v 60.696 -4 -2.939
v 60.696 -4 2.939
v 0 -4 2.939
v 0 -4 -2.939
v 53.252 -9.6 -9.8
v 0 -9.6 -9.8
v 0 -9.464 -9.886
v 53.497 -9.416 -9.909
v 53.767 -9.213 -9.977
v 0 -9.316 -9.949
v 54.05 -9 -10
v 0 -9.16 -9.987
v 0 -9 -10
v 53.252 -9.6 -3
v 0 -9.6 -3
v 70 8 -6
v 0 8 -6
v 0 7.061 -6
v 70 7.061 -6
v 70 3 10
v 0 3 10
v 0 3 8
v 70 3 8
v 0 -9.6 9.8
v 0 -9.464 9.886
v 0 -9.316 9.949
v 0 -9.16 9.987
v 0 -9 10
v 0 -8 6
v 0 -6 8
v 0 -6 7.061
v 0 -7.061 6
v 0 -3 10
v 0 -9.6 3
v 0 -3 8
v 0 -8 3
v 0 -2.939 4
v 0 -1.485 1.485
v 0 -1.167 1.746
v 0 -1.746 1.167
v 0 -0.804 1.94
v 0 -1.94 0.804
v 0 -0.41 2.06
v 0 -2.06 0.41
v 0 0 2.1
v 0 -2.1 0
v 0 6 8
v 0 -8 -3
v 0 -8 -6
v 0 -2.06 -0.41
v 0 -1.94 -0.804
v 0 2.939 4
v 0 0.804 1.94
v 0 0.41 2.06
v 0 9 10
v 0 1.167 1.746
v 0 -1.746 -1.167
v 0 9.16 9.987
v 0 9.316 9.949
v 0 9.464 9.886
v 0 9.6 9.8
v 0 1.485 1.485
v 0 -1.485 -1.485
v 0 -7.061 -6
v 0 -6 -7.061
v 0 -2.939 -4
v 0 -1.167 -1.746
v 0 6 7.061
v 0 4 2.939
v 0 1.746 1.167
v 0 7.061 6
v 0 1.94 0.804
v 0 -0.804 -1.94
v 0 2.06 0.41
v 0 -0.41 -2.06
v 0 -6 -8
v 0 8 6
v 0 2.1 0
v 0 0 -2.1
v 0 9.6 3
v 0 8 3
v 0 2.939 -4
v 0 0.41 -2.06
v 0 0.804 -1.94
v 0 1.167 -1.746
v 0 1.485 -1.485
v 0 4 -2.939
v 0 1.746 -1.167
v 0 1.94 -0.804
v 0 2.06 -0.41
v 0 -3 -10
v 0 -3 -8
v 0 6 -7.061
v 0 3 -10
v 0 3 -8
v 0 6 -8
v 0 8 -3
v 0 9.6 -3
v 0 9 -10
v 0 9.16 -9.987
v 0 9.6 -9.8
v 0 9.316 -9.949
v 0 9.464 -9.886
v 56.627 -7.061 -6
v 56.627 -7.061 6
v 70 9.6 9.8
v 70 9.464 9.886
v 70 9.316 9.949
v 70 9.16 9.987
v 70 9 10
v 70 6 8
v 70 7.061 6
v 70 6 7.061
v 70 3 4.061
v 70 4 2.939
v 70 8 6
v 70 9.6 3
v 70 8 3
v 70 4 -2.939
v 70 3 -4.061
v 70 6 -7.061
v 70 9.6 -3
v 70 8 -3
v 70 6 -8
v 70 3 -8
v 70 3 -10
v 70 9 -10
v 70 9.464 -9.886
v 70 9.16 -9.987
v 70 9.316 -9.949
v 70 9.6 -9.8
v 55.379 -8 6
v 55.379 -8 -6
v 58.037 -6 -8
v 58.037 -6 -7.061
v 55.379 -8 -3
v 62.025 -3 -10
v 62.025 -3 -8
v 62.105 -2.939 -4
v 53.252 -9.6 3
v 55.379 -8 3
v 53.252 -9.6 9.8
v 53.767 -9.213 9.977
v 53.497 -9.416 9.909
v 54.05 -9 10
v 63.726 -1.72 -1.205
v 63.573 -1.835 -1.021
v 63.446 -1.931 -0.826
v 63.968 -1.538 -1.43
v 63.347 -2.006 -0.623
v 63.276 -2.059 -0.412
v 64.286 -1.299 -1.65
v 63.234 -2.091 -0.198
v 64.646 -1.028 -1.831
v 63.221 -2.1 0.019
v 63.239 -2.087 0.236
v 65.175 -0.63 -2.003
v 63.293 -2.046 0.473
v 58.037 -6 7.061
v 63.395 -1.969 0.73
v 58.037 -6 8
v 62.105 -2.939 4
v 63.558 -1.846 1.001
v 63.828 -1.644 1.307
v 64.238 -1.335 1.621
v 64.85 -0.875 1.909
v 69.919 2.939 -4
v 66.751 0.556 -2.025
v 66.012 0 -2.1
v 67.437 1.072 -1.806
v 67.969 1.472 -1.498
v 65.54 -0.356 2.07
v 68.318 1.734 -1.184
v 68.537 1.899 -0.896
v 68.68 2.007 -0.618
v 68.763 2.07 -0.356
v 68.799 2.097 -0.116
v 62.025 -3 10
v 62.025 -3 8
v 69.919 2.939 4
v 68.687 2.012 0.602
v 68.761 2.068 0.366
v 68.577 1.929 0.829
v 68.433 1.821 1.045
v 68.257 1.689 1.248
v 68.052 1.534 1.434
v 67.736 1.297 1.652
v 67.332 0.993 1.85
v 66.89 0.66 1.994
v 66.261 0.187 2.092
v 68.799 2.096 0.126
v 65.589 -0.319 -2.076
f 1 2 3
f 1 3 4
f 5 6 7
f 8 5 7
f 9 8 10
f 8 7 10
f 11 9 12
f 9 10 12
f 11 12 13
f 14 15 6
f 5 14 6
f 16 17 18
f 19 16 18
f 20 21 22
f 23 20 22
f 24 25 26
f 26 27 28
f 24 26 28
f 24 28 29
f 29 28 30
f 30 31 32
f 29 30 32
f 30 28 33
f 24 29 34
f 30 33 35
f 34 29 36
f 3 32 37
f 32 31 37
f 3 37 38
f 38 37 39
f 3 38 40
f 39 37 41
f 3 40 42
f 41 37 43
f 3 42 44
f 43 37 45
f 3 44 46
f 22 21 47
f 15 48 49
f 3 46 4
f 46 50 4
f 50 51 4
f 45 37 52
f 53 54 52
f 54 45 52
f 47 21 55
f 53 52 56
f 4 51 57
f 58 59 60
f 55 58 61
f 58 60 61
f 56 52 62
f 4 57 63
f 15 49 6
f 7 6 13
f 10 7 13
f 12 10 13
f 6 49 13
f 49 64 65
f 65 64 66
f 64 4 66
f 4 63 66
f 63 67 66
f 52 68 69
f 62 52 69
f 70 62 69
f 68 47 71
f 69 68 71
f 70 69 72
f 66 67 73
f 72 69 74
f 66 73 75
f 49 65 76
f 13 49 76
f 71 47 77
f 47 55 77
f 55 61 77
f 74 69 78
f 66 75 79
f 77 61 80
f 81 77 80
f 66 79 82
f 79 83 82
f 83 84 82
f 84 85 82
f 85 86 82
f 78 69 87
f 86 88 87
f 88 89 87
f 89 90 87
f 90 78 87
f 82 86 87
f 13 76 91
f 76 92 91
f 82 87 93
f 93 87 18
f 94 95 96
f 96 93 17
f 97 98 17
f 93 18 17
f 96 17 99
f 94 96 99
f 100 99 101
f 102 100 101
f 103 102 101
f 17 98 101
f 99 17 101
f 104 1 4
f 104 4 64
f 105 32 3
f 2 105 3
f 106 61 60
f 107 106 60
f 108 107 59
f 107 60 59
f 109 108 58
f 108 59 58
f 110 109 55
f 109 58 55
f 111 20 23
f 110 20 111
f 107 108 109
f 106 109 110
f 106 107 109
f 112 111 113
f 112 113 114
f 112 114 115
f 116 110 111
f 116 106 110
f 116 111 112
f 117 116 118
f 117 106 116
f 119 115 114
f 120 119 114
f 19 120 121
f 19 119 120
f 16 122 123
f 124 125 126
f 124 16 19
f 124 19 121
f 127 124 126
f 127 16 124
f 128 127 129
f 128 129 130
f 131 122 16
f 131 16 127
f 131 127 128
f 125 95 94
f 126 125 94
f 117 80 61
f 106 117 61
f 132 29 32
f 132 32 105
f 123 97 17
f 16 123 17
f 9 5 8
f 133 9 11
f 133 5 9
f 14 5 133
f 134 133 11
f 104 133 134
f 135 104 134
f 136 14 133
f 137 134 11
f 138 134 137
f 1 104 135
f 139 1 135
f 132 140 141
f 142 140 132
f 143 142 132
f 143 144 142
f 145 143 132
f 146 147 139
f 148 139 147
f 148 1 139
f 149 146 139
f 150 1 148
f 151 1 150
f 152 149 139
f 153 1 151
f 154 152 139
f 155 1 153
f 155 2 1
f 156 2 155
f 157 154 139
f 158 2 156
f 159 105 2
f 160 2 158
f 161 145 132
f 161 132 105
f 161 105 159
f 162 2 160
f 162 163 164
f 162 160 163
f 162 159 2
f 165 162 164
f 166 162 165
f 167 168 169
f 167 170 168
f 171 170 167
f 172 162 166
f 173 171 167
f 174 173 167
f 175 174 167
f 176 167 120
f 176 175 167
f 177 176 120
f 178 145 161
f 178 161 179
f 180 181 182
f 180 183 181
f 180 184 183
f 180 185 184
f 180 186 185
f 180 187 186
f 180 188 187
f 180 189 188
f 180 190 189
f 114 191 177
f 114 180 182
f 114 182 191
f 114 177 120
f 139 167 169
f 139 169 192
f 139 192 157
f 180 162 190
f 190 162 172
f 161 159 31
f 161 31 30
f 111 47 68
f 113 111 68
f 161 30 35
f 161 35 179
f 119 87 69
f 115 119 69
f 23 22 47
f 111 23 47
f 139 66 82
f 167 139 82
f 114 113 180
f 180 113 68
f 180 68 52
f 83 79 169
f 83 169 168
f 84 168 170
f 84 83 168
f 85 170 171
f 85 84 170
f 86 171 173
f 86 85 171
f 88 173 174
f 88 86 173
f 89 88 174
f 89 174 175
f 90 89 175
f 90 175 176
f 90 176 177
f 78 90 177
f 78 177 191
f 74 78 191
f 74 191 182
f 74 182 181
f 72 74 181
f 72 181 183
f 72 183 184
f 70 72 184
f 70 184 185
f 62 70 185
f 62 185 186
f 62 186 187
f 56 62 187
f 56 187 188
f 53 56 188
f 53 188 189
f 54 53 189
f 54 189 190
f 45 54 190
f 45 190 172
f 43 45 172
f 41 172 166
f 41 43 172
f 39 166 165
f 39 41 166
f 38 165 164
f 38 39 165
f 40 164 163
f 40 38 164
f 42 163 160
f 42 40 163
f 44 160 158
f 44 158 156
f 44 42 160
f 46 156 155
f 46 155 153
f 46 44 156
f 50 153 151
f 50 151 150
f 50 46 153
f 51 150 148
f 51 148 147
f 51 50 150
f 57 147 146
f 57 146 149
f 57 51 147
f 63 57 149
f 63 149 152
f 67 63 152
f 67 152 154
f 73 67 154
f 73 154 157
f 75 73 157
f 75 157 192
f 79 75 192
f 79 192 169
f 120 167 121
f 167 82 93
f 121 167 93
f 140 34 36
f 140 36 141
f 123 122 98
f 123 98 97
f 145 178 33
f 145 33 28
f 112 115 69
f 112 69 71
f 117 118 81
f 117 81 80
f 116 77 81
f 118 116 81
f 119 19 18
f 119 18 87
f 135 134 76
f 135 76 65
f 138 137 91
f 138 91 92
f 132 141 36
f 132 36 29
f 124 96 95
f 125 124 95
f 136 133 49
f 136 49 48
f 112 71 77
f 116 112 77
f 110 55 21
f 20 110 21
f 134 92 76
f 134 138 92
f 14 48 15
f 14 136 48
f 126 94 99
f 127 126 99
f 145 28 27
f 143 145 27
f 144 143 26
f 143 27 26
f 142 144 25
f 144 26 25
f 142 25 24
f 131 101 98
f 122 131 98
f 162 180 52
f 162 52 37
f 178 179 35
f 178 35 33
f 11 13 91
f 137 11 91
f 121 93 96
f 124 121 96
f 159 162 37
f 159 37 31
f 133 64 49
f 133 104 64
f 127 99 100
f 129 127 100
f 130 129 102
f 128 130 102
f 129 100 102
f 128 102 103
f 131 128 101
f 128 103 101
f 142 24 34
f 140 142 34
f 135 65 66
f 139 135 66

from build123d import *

# Parameters (mm, degrees)
SKETCH1_R                = 2.1
BOSS_EXTRUDE1_DEPTH      = 70
CUT_EXTRUDE_1_DEPTH      = 1
CUT_EXTRUDE_1_DEPTH_BACK = 21


with BuildPart() as part:
    # Sketch1 → Boss-Extrude1 (new body)
    with BuildSketch(Plane(origin=(0, 0, 0), x_dir=(0, 0, -1), z_dir=(1, 0, 0))):
        with BuildLine():
            Line((-10, 9), (-10, 3))
            Line((-10, 3), (-8, 3))
            Line((-8, 3), (-8, 6))
            Line((-8, 6), (-7.060660172, 6))
            Line((-7.060660172, 6), (-4, 2.939339828))
            Line((-4, 2.939339828), (-4, -2.939339828))
            Line((-4, -2.939339828), (-7.060660172, -6))
            Line((-7.060660172, -6), (-8, -6))
            Line((-8, -6), (-8, -3))
            Line((-8, -3), (-10, -3))
            Line((-10, -3), (-10, -9))
            ThreePointArc((-10, -9), (-9.948683298, -9.316227766), (-9.8, -9.6))
            Line((-9.8, -9.6), (-3, -9.6))
            Line((-3, -9.6), (-3, -8))
            Line((-3, -8), (-6, -8))
            Line((-6, -8), (-6, -7.060660172))
            Line((-6, -7.060660172), (-2.939339828, -4))
            Line((-2.939339828, -4), (2.939339828, -4))
            Line((2.939339828, -4), (6, -7.060660172))
            Line((6, -7.060660172), (6, -8))
            Line((6, -8), (3, -8))
            Line((3, -8), (3, -9.6))
            Line((3, -9.6), (9.8, -9.6))
            ThreePointArc((9.8, -9.6), (9.948683298, -9.316227766), (10, -9))
            Line((10, -9), (10, -3))
            Line((10, -3), (8, -3))
            Line((8, -3), (8, -6))
            Line((8, -6), (7.060660172, -6))
            Line((7.060660172, -6), (4, -2.939339828))
            Line((4, -2.939339828), (4, 2.939339828))
            Line((4, 2.939339828), (7.060660172, 6))
            Line((7.060660172, 6), (8, 6))
            Line((8, 6), (8, 3))
            Line((8, 3), (10, 3))
            Line((10, 3), (10, 9))
            ThreePointArc((10, 9), (9.948683298, 9.316227766), (9.8, 9.6))
            Line((9.8, 9.6), (3, 9.6))
            Line((3, 9.6), (3, 8))
            Line((3, 8), (6, 8))
            Line((6, 8), (6, 7.060660172))
            Line((6, 7.060660172), (2.939339828, 4))
            Line((2.939339828, 4), (-2.939339828, 4))
            Line((-2.939339828, 4), (-6, 7.060660172))
            Line((-6, 7.060660172), (-6, 8))
            Line((-6, 8), (-3, 8))
            Line((-3, 8), (-3, 9.6))
            Line((-3, 9.6), (-9.8, 9.6))
            ThreePointArc((-9.8, 9.6), (-9.948683298, 9.316227766), (-10, 9))
        make_face()
        Circle(SKETCH1_R, mode=Mode.SUBTRACT)
    extrude(amount=BOSS_EXTRUDE1_DEPTH)

    # 草图1 → 切除-拉伸1 (cut, two sides)
    with BuildSketch(Plane.XY.offset(10)) as cut_extrude_1_sk:
        Polygon((53.252194875, -9.6), (70, 3), (72.108704706, -2.849693058), (72.521016137, -11.388110896), align=None)
    extrude(amount=CUT_EXTRUDE_1_DEPTH, mode=Mode.SUBTRACT)
    extrude(cut_extrude_1_sk.sketch, amount=-CUT_EXTRUDE_1_DEPTH_BACK, mode=Mode.SUBTRACT)


solid = part.part
